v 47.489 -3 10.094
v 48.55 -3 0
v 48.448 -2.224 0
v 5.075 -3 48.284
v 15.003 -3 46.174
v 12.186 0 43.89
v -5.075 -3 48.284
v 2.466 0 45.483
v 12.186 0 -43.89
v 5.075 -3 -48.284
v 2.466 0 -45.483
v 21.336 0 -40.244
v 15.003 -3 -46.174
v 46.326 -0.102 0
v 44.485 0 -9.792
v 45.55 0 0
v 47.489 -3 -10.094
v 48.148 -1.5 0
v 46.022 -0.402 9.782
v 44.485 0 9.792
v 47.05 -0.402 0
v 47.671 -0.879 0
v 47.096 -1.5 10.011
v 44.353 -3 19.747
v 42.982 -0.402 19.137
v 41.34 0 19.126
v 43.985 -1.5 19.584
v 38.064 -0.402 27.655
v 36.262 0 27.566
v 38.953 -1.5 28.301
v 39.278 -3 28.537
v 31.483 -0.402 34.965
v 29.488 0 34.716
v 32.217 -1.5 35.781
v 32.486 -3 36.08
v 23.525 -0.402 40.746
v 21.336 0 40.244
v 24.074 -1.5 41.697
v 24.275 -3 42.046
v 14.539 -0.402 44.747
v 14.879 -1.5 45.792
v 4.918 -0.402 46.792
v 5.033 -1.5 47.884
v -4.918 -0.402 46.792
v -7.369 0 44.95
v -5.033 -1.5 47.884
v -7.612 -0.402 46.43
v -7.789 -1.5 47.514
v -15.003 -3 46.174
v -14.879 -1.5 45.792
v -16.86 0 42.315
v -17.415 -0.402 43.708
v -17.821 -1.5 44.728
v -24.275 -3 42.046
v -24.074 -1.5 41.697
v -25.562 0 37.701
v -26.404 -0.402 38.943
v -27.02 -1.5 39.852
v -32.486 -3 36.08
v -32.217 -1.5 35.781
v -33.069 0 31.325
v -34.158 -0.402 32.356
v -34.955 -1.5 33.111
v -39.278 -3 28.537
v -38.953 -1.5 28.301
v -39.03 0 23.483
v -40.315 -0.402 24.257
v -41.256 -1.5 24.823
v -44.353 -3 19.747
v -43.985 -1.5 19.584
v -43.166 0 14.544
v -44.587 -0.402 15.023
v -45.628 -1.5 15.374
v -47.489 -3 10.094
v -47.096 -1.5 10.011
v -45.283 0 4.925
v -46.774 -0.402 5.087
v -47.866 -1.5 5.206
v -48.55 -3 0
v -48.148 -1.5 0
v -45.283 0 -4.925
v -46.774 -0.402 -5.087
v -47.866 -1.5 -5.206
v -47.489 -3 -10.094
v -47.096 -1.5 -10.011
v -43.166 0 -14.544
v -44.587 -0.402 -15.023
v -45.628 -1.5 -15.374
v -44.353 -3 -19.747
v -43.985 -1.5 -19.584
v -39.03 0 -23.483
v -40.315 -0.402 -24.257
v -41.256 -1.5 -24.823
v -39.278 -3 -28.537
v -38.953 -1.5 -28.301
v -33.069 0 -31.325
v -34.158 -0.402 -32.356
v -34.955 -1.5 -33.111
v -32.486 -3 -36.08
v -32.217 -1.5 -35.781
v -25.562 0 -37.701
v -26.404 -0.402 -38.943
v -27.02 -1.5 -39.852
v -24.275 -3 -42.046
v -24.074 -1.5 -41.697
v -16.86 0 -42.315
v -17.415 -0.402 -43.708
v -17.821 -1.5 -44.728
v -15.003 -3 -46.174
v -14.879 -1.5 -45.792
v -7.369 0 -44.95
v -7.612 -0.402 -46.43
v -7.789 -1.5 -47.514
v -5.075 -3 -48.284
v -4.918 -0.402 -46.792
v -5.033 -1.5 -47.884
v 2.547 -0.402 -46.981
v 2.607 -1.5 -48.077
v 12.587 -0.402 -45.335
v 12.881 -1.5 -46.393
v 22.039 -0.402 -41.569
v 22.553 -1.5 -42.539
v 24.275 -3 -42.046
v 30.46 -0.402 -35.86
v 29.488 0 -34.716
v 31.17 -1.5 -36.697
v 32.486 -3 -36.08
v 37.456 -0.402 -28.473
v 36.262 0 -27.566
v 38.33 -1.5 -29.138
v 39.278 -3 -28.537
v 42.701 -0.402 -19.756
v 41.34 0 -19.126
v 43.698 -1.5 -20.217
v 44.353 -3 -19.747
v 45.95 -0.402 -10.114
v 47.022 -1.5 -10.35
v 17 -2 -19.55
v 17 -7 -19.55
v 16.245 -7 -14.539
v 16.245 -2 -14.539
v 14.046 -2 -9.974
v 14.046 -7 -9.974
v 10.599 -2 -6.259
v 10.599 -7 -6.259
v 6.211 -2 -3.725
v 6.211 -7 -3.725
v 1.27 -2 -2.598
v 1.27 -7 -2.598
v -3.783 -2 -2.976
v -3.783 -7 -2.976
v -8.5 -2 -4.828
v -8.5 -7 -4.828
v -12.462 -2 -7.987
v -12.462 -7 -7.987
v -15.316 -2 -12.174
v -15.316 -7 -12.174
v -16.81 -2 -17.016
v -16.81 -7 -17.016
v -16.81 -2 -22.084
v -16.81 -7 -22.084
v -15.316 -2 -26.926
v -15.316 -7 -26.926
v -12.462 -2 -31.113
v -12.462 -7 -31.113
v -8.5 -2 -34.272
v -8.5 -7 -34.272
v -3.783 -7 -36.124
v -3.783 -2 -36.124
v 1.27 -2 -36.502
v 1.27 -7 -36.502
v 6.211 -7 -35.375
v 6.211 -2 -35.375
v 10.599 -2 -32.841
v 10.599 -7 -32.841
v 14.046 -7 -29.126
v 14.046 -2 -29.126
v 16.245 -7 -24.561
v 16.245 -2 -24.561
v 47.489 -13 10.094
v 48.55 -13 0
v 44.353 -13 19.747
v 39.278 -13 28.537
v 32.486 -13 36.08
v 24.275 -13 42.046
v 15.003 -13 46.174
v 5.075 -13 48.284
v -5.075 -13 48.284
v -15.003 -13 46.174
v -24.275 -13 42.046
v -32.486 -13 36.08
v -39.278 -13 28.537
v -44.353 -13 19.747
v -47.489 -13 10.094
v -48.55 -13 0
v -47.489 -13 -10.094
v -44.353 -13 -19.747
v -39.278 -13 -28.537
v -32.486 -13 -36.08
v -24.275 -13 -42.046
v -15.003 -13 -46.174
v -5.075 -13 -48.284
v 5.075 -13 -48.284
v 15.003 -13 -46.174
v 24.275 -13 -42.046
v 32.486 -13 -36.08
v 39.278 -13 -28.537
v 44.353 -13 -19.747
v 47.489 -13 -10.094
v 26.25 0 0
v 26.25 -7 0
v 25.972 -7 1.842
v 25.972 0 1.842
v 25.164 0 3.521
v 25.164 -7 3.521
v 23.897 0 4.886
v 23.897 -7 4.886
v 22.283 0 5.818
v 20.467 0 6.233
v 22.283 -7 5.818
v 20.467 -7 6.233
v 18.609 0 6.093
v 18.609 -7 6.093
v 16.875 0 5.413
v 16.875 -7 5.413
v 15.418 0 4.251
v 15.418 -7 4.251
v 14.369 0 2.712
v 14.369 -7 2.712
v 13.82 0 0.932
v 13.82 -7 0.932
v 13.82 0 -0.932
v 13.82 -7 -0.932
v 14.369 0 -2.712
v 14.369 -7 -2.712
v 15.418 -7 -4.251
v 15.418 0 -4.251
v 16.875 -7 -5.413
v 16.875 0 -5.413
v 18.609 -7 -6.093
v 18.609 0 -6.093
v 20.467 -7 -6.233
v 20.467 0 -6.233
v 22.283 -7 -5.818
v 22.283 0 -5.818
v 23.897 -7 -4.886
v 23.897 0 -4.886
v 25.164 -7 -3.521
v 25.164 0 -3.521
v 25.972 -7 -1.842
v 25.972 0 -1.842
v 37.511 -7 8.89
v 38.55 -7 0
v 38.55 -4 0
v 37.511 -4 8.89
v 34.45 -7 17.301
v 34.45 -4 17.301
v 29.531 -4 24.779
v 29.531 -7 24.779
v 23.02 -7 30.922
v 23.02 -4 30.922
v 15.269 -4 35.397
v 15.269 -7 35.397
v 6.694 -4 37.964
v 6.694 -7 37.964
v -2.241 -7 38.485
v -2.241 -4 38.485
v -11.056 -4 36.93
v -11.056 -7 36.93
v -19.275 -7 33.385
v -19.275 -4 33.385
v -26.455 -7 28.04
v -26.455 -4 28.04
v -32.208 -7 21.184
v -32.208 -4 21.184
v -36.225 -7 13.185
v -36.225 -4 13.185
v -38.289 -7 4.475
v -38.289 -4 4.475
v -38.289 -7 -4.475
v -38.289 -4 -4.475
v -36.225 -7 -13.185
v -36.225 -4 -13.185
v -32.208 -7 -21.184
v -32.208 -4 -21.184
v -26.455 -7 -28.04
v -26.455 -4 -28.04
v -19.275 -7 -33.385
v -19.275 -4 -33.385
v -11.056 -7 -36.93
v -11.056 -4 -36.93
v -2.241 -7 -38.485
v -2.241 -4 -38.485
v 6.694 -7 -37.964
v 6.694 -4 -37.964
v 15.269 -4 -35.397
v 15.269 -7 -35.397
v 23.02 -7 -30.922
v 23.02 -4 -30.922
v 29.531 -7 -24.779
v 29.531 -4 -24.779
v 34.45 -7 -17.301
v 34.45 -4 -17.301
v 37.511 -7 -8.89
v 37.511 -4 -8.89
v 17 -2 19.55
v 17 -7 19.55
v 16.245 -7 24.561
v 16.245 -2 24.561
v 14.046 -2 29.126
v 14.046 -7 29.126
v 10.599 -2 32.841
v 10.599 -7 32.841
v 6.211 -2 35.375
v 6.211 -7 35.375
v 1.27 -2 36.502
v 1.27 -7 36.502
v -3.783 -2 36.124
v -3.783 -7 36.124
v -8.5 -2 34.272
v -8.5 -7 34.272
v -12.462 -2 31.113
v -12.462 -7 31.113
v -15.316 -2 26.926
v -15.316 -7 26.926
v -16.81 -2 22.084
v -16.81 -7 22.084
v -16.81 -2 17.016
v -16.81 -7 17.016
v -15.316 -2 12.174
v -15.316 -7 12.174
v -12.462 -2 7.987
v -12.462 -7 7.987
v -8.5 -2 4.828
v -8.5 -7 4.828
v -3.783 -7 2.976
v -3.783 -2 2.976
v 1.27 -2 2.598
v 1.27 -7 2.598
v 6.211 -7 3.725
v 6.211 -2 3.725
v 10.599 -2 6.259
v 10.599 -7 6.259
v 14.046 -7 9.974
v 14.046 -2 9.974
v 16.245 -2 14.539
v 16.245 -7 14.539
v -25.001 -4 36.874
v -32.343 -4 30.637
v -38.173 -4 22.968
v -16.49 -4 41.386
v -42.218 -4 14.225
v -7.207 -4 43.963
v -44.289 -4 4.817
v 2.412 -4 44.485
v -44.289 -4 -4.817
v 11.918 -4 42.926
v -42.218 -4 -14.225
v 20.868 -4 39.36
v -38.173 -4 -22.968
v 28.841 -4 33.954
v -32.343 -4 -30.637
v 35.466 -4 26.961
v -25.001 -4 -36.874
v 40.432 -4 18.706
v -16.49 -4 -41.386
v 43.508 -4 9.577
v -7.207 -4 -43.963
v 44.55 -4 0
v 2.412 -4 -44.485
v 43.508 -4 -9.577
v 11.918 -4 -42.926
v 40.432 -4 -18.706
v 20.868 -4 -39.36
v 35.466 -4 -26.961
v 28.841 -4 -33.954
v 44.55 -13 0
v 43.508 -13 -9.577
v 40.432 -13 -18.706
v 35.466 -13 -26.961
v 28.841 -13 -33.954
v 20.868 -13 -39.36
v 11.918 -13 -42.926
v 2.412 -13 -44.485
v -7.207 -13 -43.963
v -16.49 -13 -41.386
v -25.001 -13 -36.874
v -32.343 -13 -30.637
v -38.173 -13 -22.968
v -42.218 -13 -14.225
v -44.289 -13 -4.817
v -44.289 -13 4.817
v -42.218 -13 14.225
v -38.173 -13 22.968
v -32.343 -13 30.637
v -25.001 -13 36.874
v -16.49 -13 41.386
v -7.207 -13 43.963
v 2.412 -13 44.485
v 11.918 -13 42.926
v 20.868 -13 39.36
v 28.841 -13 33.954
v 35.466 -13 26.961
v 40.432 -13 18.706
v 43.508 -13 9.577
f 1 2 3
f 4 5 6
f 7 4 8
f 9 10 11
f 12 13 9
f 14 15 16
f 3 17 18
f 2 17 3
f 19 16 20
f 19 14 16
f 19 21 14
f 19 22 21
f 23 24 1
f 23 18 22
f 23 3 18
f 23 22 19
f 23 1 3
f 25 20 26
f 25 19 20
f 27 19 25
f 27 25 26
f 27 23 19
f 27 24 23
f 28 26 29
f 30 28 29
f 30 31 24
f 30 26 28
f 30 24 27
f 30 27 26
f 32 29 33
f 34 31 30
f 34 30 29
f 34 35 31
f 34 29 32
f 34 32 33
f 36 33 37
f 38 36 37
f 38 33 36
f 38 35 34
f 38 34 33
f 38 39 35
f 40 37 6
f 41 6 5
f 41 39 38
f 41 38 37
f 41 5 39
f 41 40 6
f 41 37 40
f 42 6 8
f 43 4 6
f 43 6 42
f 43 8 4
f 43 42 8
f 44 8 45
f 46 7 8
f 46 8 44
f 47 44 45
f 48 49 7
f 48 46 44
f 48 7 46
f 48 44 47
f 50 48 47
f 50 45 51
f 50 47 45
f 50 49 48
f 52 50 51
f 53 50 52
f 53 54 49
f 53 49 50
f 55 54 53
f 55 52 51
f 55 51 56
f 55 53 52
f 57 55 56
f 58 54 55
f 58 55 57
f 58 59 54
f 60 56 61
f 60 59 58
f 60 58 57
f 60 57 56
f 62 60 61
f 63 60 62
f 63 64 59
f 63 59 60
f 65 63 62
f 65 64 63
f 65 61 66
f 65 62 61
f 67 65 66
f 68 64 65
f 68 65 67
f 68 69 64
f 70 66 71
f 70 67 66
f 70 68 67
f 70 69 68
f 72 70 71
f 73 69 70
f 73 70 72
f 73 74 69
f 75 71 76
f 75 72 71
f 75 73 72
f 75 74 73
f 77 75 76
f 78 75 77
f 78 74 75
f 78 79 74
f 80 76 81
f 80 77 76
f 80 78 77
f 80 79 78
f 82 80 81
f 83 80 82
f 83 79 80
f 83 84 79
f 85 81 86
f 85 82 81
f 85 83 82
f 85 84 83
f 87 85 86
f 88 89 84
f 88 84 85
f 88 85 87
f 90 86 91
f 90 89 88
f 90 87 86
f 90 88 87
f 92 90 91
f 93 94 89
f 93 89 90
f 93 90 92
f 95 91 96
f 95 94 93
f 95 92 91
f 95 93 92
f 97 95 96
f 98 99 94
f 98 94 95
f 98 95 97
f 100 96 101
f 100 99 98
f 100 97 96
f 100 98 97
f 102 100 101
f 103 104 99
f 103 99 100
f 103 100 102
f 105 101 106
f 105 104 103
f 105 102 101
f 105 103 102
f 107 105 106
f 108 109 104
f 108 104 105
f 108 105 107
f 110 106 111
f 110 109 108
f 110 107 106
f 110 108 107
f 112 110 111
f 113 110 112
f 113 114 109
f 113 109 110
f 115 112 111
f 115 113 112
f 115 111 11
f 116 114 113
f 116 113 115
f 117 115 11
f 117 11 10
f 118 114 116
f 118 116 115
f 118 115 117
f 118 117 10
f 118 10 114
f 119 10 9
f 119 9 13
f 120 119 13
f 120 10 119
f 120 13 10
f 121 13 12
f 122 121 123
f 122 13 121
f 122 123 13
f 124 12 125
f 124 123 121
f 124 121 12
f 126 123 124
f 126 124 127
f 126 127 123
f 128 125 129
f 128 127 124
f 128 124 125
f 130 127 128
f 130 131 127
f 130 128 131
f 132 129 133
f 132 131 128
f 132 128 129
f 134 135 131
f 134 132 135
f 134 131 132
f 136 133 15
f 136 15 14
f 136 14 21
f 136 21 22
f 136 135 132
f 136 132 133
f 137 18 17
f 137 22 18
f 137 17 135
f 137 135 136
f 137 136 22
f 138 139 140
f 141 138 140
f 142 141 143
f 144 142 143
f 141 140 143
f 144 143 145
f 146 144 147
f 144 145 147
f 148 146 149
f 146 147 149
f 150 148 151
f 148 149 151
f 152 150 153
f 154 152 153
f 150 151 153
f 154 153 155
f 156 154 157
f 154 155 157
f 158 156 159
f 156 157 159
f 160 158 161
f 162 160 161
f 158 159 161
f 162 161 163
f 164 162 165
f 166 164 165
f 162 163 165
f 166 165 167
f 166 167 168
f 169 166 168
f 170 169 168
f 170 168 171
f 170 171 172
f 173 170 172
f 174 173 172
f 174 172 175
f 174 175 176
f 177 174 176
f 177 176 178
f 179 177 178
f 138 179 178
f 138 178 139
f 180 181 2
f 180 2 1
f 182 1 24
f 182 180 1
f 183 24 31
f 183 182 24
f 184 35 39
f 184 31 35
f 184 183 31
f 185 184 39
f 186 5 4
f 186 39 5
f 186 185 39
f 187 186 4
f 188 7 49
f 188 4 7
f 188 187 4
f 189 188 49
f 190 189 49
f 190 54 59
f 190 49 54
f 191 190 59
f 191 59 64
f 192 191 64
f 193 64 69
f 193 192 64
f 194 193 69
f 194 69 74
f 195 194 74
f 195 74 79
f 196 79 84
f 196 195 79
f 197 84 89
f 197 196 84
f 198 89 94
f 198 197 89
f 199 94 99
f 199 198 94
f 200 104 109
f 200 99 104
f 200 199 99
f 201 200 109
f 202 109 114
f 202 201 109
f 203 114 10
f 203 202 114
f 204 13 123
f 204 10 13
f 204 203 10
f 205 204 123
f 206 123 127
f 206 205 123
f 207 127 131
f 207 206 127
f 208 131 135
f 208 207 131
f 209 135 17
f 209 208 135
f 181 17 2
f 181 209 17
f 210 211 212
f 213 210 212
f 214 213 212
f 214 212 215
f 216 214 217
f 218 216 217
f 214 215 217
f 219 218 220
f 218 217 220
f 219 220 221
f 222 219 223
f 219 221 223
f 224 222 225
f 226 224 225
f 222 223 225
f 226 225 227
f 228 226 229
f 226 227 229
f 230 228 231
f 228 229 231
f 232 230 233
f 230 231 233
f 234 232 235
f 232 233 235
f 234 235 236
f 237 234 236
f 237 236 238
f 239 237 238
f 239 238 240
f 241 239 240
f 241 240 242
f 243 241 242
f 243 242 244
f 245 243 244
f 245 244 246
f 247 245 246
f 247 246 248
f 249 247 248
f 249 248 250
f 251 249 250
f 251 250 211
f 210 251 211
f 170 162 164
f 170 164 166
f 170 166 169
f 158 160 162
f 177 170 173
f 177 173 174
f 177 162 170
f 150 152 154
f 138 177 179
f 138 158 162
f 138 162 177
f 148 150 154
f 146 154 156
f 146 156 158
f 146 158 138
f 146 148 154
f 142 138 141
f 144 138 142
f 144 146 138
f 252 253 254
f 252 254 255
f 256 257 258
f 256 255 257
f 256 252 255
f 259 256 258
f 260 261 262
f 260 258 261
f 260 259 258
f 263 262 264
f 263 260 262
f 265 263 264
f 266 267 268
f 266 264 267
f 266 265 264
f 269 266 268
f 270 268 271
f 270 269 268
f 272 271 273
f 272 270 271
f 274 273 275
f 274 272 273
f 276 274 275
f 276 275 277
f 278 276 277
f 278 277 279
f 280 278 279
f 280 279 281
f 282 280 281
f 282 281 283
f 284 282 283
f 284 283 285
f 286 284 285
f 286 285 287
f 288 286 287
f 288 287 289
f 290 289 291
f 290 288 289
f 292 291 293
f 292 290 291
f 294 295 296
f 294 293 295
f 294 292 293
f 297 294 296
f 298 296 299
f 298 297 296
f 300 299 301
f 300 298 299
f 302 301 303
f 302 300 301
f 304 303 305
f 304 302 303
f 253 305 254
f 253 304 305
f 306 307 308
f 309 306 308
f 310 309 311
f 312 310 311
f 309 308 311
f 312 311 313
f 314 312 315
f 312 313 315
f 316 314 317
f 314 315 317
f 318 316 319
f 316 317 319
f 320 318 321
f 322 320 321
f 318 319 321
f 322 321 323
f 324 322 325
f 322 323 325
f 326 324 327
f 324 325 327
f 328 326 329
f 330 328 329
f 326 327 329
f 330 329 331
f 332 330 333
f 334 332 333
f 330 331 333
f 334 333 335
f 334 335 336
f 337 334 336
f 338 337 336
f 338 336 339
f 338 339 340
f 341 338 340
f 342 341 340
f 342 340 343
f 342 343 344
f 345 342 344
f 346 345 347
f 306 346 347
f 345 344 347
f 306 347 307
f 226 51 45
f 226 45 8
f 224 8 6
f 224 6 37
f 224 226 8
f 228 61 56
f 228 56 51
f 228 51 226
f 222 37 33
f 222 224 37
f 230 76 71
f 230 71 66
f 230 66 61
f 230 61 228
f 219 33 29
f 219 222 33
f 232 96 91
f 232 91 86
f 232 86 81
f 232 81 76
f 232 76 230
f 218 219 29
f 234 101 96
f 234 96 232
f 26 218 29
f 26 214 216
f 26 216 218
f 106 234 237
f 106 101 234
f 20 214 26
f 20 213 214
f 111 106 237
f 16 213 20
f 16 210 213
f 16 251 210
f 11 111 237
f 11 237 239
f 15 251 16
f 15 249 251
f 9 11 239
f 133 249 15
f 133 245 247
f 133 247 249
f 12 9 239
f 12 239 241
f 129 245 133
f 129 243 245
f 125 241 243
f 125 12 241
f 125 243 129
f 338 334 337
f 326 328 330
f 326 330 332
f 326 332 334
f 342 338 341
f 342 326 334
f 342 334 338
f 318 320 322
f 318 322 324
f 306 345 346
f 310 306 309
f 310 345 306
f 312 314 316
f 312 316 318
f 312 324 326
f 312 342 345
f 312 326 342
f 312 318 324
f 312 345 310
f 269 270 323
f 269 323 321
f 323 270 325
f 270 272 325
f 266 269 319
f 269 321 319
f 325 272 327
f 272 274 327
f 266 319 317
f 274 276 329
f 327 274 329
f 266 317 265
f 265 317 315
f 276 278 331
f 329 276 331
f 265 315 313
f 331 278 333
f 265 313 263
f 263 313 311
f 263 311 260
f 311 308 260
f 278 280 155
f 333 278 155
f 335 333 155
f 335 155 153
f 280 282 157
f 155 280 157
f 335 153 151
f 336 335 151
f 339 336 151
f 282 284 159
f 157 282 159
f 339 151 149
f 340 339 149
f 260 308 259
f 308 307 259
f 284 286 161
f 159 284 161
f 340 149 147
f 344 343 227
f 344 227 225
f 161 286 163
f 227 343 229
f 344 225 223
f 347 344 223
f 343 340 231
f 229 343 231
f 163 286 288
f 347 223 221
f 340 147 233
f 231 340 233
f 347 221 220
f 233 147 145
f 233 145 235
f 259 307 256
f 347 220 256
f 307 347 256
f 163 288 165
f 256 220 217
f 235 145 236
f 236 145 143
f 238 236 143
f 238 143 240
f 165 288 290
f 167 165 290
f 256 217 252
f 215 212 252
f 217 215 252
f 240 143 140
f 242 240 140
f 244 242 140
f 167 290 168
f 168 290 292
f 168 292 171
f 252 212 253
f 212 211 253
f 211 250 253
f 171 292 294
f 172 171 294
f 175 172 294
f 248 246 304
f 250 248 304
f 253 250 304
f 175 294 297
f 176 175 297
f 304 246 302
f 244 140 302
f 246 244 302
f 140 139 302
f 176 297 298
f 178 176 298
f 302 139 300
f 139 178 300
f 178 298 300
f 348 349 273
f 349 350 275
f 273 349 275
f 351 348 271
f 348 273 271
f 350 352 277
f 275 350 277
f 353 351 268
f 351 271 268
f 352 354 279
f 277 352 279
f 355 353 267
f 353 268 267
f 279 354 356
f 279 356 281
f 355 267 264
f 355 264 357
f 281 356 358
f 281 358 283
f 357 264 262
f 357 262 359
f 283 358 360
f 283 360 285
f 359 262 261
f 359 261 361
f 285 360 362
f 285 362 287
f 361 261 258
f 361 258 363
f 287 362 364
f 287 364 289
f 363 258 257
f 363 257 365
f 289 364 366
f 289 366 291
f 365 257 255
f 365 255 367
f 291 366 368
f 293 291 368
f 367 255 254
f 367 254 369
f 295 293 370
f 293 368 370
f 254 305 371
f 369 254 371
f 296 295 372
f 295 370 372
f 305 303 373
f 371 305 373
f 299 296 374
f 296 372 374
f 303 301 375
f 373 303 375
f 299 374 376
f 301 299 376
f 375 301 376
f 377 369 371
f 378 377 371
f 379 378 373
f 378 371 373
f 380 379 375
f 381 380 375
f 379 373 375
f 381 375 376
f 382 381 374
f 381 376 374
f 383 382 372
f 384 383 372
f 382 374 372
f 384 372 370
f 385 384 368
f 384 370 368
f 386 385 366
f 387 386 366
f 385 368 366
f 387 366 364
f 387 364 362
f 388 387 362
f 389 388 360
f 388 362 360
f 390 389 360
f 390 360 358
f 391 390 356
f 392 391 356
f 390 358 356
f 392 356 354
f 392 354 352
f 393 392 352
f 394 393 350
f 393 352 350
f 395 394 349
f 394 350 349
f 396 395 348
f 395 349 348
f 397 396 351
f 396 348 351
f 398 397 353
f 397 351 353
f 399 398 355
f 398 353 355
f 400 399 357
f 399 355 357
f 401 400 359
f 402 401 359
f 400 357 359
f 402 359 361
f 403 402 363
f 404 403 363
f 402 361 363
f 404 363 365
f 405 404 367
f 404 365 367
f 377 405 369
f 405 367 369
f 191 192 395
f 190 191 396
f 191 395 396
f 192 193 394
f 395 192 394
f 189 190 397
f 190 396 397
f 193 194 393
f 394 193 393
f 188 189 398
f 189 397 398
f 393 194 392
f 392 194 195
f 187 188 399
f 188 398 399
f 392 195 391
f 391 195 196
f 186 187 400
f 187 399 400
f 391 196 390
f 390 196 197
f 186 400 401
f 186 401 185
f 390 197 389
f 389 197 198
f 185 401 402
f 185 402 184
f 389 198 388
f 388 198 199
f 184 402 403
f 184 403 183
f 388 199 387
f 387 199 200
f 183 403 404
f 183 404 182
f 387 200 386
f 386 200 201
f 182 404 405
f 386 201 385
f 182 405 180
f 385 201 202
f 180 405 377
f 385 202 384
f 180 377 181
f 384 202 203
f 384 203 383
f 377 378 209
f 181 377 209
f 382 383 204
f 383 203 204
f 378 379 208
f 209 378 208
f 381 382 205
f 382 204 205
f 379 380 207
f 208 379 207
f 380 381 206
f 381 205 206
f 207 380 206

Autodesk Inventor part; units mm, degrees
ref_plane "YZ Plane" through (0, 0, 0) normal (1, 0, 0) x (0, 1, 0)
ref_plane "XZ Plane" through (0, 0, 0) normal (0, 1, 0) x (-1, 0, 0)
ref_plane "XY Plane" through (0, 0, 0) normal (0, 0, 1) x (1, 0, 0)
sketch "Sketch2" plane through (0, 0, 0) normal (0, 0, 1) x (1, 0, 0)
  line L0 (0, 0) -> (48.55, 0)
  line L1 (48.55, 0) -> (48.55, -13)
  line L2 (48.55, -13) -> (44.55, -13)
  line L3 (44.55, -13) -> (44.55, -4)
  line L4 (44.55, -4) -> (38.55, -4)
  line L5 (38.55, -4) -> (38.55, -7)
  line L6 (38.55, -7) -> (0, -7)
  line L7 (0, -7) -> (0, 0)
  dimension "d0" = 48.55
  dimension "d1" = 4
  dimension "d2" = 6
  dimension "d3" = 13
  dimension "d4" = 4
  dimension "d5" = 7
revolve "Revolution1" add sketch "Sketch2" angle 360 about axis through (0, -7, 0) along (0, 1, 0)
fillet "Fillet1" radius 3 1 edges at (-48.55, 0, 0)
sketch "Sketch3" plane through (0, -7, 0) normal (0, -1, 0) x (1, 0, 0)
  circle A0 centre (0, -19.55) radius 17
  circle A1 centre (0, 0) radius 38.55 projected
  circle A2 centre (0, 19.55) radius 17
  dimension "d8" = 34
  dimension "d11" = 360
  dimension "d15" = 19.55
extrude "Extrusion1" cut sketch "Sketch3" against normal blind 5 contours A0 | A2
sketch "Sketch5" plane through (0, -7, 0) normal (0, -1, 0) x (1, 0, 0)
  circle A0 centre (20, 0) radius 6.25
  point P0 (0, 0)
  dimension "d16" = 12.5
  dimension "d17" = 20
extrude "Extrusion2" cut sketch "Sketch5" against normal through all
properties part number "lid-proto-v1"
